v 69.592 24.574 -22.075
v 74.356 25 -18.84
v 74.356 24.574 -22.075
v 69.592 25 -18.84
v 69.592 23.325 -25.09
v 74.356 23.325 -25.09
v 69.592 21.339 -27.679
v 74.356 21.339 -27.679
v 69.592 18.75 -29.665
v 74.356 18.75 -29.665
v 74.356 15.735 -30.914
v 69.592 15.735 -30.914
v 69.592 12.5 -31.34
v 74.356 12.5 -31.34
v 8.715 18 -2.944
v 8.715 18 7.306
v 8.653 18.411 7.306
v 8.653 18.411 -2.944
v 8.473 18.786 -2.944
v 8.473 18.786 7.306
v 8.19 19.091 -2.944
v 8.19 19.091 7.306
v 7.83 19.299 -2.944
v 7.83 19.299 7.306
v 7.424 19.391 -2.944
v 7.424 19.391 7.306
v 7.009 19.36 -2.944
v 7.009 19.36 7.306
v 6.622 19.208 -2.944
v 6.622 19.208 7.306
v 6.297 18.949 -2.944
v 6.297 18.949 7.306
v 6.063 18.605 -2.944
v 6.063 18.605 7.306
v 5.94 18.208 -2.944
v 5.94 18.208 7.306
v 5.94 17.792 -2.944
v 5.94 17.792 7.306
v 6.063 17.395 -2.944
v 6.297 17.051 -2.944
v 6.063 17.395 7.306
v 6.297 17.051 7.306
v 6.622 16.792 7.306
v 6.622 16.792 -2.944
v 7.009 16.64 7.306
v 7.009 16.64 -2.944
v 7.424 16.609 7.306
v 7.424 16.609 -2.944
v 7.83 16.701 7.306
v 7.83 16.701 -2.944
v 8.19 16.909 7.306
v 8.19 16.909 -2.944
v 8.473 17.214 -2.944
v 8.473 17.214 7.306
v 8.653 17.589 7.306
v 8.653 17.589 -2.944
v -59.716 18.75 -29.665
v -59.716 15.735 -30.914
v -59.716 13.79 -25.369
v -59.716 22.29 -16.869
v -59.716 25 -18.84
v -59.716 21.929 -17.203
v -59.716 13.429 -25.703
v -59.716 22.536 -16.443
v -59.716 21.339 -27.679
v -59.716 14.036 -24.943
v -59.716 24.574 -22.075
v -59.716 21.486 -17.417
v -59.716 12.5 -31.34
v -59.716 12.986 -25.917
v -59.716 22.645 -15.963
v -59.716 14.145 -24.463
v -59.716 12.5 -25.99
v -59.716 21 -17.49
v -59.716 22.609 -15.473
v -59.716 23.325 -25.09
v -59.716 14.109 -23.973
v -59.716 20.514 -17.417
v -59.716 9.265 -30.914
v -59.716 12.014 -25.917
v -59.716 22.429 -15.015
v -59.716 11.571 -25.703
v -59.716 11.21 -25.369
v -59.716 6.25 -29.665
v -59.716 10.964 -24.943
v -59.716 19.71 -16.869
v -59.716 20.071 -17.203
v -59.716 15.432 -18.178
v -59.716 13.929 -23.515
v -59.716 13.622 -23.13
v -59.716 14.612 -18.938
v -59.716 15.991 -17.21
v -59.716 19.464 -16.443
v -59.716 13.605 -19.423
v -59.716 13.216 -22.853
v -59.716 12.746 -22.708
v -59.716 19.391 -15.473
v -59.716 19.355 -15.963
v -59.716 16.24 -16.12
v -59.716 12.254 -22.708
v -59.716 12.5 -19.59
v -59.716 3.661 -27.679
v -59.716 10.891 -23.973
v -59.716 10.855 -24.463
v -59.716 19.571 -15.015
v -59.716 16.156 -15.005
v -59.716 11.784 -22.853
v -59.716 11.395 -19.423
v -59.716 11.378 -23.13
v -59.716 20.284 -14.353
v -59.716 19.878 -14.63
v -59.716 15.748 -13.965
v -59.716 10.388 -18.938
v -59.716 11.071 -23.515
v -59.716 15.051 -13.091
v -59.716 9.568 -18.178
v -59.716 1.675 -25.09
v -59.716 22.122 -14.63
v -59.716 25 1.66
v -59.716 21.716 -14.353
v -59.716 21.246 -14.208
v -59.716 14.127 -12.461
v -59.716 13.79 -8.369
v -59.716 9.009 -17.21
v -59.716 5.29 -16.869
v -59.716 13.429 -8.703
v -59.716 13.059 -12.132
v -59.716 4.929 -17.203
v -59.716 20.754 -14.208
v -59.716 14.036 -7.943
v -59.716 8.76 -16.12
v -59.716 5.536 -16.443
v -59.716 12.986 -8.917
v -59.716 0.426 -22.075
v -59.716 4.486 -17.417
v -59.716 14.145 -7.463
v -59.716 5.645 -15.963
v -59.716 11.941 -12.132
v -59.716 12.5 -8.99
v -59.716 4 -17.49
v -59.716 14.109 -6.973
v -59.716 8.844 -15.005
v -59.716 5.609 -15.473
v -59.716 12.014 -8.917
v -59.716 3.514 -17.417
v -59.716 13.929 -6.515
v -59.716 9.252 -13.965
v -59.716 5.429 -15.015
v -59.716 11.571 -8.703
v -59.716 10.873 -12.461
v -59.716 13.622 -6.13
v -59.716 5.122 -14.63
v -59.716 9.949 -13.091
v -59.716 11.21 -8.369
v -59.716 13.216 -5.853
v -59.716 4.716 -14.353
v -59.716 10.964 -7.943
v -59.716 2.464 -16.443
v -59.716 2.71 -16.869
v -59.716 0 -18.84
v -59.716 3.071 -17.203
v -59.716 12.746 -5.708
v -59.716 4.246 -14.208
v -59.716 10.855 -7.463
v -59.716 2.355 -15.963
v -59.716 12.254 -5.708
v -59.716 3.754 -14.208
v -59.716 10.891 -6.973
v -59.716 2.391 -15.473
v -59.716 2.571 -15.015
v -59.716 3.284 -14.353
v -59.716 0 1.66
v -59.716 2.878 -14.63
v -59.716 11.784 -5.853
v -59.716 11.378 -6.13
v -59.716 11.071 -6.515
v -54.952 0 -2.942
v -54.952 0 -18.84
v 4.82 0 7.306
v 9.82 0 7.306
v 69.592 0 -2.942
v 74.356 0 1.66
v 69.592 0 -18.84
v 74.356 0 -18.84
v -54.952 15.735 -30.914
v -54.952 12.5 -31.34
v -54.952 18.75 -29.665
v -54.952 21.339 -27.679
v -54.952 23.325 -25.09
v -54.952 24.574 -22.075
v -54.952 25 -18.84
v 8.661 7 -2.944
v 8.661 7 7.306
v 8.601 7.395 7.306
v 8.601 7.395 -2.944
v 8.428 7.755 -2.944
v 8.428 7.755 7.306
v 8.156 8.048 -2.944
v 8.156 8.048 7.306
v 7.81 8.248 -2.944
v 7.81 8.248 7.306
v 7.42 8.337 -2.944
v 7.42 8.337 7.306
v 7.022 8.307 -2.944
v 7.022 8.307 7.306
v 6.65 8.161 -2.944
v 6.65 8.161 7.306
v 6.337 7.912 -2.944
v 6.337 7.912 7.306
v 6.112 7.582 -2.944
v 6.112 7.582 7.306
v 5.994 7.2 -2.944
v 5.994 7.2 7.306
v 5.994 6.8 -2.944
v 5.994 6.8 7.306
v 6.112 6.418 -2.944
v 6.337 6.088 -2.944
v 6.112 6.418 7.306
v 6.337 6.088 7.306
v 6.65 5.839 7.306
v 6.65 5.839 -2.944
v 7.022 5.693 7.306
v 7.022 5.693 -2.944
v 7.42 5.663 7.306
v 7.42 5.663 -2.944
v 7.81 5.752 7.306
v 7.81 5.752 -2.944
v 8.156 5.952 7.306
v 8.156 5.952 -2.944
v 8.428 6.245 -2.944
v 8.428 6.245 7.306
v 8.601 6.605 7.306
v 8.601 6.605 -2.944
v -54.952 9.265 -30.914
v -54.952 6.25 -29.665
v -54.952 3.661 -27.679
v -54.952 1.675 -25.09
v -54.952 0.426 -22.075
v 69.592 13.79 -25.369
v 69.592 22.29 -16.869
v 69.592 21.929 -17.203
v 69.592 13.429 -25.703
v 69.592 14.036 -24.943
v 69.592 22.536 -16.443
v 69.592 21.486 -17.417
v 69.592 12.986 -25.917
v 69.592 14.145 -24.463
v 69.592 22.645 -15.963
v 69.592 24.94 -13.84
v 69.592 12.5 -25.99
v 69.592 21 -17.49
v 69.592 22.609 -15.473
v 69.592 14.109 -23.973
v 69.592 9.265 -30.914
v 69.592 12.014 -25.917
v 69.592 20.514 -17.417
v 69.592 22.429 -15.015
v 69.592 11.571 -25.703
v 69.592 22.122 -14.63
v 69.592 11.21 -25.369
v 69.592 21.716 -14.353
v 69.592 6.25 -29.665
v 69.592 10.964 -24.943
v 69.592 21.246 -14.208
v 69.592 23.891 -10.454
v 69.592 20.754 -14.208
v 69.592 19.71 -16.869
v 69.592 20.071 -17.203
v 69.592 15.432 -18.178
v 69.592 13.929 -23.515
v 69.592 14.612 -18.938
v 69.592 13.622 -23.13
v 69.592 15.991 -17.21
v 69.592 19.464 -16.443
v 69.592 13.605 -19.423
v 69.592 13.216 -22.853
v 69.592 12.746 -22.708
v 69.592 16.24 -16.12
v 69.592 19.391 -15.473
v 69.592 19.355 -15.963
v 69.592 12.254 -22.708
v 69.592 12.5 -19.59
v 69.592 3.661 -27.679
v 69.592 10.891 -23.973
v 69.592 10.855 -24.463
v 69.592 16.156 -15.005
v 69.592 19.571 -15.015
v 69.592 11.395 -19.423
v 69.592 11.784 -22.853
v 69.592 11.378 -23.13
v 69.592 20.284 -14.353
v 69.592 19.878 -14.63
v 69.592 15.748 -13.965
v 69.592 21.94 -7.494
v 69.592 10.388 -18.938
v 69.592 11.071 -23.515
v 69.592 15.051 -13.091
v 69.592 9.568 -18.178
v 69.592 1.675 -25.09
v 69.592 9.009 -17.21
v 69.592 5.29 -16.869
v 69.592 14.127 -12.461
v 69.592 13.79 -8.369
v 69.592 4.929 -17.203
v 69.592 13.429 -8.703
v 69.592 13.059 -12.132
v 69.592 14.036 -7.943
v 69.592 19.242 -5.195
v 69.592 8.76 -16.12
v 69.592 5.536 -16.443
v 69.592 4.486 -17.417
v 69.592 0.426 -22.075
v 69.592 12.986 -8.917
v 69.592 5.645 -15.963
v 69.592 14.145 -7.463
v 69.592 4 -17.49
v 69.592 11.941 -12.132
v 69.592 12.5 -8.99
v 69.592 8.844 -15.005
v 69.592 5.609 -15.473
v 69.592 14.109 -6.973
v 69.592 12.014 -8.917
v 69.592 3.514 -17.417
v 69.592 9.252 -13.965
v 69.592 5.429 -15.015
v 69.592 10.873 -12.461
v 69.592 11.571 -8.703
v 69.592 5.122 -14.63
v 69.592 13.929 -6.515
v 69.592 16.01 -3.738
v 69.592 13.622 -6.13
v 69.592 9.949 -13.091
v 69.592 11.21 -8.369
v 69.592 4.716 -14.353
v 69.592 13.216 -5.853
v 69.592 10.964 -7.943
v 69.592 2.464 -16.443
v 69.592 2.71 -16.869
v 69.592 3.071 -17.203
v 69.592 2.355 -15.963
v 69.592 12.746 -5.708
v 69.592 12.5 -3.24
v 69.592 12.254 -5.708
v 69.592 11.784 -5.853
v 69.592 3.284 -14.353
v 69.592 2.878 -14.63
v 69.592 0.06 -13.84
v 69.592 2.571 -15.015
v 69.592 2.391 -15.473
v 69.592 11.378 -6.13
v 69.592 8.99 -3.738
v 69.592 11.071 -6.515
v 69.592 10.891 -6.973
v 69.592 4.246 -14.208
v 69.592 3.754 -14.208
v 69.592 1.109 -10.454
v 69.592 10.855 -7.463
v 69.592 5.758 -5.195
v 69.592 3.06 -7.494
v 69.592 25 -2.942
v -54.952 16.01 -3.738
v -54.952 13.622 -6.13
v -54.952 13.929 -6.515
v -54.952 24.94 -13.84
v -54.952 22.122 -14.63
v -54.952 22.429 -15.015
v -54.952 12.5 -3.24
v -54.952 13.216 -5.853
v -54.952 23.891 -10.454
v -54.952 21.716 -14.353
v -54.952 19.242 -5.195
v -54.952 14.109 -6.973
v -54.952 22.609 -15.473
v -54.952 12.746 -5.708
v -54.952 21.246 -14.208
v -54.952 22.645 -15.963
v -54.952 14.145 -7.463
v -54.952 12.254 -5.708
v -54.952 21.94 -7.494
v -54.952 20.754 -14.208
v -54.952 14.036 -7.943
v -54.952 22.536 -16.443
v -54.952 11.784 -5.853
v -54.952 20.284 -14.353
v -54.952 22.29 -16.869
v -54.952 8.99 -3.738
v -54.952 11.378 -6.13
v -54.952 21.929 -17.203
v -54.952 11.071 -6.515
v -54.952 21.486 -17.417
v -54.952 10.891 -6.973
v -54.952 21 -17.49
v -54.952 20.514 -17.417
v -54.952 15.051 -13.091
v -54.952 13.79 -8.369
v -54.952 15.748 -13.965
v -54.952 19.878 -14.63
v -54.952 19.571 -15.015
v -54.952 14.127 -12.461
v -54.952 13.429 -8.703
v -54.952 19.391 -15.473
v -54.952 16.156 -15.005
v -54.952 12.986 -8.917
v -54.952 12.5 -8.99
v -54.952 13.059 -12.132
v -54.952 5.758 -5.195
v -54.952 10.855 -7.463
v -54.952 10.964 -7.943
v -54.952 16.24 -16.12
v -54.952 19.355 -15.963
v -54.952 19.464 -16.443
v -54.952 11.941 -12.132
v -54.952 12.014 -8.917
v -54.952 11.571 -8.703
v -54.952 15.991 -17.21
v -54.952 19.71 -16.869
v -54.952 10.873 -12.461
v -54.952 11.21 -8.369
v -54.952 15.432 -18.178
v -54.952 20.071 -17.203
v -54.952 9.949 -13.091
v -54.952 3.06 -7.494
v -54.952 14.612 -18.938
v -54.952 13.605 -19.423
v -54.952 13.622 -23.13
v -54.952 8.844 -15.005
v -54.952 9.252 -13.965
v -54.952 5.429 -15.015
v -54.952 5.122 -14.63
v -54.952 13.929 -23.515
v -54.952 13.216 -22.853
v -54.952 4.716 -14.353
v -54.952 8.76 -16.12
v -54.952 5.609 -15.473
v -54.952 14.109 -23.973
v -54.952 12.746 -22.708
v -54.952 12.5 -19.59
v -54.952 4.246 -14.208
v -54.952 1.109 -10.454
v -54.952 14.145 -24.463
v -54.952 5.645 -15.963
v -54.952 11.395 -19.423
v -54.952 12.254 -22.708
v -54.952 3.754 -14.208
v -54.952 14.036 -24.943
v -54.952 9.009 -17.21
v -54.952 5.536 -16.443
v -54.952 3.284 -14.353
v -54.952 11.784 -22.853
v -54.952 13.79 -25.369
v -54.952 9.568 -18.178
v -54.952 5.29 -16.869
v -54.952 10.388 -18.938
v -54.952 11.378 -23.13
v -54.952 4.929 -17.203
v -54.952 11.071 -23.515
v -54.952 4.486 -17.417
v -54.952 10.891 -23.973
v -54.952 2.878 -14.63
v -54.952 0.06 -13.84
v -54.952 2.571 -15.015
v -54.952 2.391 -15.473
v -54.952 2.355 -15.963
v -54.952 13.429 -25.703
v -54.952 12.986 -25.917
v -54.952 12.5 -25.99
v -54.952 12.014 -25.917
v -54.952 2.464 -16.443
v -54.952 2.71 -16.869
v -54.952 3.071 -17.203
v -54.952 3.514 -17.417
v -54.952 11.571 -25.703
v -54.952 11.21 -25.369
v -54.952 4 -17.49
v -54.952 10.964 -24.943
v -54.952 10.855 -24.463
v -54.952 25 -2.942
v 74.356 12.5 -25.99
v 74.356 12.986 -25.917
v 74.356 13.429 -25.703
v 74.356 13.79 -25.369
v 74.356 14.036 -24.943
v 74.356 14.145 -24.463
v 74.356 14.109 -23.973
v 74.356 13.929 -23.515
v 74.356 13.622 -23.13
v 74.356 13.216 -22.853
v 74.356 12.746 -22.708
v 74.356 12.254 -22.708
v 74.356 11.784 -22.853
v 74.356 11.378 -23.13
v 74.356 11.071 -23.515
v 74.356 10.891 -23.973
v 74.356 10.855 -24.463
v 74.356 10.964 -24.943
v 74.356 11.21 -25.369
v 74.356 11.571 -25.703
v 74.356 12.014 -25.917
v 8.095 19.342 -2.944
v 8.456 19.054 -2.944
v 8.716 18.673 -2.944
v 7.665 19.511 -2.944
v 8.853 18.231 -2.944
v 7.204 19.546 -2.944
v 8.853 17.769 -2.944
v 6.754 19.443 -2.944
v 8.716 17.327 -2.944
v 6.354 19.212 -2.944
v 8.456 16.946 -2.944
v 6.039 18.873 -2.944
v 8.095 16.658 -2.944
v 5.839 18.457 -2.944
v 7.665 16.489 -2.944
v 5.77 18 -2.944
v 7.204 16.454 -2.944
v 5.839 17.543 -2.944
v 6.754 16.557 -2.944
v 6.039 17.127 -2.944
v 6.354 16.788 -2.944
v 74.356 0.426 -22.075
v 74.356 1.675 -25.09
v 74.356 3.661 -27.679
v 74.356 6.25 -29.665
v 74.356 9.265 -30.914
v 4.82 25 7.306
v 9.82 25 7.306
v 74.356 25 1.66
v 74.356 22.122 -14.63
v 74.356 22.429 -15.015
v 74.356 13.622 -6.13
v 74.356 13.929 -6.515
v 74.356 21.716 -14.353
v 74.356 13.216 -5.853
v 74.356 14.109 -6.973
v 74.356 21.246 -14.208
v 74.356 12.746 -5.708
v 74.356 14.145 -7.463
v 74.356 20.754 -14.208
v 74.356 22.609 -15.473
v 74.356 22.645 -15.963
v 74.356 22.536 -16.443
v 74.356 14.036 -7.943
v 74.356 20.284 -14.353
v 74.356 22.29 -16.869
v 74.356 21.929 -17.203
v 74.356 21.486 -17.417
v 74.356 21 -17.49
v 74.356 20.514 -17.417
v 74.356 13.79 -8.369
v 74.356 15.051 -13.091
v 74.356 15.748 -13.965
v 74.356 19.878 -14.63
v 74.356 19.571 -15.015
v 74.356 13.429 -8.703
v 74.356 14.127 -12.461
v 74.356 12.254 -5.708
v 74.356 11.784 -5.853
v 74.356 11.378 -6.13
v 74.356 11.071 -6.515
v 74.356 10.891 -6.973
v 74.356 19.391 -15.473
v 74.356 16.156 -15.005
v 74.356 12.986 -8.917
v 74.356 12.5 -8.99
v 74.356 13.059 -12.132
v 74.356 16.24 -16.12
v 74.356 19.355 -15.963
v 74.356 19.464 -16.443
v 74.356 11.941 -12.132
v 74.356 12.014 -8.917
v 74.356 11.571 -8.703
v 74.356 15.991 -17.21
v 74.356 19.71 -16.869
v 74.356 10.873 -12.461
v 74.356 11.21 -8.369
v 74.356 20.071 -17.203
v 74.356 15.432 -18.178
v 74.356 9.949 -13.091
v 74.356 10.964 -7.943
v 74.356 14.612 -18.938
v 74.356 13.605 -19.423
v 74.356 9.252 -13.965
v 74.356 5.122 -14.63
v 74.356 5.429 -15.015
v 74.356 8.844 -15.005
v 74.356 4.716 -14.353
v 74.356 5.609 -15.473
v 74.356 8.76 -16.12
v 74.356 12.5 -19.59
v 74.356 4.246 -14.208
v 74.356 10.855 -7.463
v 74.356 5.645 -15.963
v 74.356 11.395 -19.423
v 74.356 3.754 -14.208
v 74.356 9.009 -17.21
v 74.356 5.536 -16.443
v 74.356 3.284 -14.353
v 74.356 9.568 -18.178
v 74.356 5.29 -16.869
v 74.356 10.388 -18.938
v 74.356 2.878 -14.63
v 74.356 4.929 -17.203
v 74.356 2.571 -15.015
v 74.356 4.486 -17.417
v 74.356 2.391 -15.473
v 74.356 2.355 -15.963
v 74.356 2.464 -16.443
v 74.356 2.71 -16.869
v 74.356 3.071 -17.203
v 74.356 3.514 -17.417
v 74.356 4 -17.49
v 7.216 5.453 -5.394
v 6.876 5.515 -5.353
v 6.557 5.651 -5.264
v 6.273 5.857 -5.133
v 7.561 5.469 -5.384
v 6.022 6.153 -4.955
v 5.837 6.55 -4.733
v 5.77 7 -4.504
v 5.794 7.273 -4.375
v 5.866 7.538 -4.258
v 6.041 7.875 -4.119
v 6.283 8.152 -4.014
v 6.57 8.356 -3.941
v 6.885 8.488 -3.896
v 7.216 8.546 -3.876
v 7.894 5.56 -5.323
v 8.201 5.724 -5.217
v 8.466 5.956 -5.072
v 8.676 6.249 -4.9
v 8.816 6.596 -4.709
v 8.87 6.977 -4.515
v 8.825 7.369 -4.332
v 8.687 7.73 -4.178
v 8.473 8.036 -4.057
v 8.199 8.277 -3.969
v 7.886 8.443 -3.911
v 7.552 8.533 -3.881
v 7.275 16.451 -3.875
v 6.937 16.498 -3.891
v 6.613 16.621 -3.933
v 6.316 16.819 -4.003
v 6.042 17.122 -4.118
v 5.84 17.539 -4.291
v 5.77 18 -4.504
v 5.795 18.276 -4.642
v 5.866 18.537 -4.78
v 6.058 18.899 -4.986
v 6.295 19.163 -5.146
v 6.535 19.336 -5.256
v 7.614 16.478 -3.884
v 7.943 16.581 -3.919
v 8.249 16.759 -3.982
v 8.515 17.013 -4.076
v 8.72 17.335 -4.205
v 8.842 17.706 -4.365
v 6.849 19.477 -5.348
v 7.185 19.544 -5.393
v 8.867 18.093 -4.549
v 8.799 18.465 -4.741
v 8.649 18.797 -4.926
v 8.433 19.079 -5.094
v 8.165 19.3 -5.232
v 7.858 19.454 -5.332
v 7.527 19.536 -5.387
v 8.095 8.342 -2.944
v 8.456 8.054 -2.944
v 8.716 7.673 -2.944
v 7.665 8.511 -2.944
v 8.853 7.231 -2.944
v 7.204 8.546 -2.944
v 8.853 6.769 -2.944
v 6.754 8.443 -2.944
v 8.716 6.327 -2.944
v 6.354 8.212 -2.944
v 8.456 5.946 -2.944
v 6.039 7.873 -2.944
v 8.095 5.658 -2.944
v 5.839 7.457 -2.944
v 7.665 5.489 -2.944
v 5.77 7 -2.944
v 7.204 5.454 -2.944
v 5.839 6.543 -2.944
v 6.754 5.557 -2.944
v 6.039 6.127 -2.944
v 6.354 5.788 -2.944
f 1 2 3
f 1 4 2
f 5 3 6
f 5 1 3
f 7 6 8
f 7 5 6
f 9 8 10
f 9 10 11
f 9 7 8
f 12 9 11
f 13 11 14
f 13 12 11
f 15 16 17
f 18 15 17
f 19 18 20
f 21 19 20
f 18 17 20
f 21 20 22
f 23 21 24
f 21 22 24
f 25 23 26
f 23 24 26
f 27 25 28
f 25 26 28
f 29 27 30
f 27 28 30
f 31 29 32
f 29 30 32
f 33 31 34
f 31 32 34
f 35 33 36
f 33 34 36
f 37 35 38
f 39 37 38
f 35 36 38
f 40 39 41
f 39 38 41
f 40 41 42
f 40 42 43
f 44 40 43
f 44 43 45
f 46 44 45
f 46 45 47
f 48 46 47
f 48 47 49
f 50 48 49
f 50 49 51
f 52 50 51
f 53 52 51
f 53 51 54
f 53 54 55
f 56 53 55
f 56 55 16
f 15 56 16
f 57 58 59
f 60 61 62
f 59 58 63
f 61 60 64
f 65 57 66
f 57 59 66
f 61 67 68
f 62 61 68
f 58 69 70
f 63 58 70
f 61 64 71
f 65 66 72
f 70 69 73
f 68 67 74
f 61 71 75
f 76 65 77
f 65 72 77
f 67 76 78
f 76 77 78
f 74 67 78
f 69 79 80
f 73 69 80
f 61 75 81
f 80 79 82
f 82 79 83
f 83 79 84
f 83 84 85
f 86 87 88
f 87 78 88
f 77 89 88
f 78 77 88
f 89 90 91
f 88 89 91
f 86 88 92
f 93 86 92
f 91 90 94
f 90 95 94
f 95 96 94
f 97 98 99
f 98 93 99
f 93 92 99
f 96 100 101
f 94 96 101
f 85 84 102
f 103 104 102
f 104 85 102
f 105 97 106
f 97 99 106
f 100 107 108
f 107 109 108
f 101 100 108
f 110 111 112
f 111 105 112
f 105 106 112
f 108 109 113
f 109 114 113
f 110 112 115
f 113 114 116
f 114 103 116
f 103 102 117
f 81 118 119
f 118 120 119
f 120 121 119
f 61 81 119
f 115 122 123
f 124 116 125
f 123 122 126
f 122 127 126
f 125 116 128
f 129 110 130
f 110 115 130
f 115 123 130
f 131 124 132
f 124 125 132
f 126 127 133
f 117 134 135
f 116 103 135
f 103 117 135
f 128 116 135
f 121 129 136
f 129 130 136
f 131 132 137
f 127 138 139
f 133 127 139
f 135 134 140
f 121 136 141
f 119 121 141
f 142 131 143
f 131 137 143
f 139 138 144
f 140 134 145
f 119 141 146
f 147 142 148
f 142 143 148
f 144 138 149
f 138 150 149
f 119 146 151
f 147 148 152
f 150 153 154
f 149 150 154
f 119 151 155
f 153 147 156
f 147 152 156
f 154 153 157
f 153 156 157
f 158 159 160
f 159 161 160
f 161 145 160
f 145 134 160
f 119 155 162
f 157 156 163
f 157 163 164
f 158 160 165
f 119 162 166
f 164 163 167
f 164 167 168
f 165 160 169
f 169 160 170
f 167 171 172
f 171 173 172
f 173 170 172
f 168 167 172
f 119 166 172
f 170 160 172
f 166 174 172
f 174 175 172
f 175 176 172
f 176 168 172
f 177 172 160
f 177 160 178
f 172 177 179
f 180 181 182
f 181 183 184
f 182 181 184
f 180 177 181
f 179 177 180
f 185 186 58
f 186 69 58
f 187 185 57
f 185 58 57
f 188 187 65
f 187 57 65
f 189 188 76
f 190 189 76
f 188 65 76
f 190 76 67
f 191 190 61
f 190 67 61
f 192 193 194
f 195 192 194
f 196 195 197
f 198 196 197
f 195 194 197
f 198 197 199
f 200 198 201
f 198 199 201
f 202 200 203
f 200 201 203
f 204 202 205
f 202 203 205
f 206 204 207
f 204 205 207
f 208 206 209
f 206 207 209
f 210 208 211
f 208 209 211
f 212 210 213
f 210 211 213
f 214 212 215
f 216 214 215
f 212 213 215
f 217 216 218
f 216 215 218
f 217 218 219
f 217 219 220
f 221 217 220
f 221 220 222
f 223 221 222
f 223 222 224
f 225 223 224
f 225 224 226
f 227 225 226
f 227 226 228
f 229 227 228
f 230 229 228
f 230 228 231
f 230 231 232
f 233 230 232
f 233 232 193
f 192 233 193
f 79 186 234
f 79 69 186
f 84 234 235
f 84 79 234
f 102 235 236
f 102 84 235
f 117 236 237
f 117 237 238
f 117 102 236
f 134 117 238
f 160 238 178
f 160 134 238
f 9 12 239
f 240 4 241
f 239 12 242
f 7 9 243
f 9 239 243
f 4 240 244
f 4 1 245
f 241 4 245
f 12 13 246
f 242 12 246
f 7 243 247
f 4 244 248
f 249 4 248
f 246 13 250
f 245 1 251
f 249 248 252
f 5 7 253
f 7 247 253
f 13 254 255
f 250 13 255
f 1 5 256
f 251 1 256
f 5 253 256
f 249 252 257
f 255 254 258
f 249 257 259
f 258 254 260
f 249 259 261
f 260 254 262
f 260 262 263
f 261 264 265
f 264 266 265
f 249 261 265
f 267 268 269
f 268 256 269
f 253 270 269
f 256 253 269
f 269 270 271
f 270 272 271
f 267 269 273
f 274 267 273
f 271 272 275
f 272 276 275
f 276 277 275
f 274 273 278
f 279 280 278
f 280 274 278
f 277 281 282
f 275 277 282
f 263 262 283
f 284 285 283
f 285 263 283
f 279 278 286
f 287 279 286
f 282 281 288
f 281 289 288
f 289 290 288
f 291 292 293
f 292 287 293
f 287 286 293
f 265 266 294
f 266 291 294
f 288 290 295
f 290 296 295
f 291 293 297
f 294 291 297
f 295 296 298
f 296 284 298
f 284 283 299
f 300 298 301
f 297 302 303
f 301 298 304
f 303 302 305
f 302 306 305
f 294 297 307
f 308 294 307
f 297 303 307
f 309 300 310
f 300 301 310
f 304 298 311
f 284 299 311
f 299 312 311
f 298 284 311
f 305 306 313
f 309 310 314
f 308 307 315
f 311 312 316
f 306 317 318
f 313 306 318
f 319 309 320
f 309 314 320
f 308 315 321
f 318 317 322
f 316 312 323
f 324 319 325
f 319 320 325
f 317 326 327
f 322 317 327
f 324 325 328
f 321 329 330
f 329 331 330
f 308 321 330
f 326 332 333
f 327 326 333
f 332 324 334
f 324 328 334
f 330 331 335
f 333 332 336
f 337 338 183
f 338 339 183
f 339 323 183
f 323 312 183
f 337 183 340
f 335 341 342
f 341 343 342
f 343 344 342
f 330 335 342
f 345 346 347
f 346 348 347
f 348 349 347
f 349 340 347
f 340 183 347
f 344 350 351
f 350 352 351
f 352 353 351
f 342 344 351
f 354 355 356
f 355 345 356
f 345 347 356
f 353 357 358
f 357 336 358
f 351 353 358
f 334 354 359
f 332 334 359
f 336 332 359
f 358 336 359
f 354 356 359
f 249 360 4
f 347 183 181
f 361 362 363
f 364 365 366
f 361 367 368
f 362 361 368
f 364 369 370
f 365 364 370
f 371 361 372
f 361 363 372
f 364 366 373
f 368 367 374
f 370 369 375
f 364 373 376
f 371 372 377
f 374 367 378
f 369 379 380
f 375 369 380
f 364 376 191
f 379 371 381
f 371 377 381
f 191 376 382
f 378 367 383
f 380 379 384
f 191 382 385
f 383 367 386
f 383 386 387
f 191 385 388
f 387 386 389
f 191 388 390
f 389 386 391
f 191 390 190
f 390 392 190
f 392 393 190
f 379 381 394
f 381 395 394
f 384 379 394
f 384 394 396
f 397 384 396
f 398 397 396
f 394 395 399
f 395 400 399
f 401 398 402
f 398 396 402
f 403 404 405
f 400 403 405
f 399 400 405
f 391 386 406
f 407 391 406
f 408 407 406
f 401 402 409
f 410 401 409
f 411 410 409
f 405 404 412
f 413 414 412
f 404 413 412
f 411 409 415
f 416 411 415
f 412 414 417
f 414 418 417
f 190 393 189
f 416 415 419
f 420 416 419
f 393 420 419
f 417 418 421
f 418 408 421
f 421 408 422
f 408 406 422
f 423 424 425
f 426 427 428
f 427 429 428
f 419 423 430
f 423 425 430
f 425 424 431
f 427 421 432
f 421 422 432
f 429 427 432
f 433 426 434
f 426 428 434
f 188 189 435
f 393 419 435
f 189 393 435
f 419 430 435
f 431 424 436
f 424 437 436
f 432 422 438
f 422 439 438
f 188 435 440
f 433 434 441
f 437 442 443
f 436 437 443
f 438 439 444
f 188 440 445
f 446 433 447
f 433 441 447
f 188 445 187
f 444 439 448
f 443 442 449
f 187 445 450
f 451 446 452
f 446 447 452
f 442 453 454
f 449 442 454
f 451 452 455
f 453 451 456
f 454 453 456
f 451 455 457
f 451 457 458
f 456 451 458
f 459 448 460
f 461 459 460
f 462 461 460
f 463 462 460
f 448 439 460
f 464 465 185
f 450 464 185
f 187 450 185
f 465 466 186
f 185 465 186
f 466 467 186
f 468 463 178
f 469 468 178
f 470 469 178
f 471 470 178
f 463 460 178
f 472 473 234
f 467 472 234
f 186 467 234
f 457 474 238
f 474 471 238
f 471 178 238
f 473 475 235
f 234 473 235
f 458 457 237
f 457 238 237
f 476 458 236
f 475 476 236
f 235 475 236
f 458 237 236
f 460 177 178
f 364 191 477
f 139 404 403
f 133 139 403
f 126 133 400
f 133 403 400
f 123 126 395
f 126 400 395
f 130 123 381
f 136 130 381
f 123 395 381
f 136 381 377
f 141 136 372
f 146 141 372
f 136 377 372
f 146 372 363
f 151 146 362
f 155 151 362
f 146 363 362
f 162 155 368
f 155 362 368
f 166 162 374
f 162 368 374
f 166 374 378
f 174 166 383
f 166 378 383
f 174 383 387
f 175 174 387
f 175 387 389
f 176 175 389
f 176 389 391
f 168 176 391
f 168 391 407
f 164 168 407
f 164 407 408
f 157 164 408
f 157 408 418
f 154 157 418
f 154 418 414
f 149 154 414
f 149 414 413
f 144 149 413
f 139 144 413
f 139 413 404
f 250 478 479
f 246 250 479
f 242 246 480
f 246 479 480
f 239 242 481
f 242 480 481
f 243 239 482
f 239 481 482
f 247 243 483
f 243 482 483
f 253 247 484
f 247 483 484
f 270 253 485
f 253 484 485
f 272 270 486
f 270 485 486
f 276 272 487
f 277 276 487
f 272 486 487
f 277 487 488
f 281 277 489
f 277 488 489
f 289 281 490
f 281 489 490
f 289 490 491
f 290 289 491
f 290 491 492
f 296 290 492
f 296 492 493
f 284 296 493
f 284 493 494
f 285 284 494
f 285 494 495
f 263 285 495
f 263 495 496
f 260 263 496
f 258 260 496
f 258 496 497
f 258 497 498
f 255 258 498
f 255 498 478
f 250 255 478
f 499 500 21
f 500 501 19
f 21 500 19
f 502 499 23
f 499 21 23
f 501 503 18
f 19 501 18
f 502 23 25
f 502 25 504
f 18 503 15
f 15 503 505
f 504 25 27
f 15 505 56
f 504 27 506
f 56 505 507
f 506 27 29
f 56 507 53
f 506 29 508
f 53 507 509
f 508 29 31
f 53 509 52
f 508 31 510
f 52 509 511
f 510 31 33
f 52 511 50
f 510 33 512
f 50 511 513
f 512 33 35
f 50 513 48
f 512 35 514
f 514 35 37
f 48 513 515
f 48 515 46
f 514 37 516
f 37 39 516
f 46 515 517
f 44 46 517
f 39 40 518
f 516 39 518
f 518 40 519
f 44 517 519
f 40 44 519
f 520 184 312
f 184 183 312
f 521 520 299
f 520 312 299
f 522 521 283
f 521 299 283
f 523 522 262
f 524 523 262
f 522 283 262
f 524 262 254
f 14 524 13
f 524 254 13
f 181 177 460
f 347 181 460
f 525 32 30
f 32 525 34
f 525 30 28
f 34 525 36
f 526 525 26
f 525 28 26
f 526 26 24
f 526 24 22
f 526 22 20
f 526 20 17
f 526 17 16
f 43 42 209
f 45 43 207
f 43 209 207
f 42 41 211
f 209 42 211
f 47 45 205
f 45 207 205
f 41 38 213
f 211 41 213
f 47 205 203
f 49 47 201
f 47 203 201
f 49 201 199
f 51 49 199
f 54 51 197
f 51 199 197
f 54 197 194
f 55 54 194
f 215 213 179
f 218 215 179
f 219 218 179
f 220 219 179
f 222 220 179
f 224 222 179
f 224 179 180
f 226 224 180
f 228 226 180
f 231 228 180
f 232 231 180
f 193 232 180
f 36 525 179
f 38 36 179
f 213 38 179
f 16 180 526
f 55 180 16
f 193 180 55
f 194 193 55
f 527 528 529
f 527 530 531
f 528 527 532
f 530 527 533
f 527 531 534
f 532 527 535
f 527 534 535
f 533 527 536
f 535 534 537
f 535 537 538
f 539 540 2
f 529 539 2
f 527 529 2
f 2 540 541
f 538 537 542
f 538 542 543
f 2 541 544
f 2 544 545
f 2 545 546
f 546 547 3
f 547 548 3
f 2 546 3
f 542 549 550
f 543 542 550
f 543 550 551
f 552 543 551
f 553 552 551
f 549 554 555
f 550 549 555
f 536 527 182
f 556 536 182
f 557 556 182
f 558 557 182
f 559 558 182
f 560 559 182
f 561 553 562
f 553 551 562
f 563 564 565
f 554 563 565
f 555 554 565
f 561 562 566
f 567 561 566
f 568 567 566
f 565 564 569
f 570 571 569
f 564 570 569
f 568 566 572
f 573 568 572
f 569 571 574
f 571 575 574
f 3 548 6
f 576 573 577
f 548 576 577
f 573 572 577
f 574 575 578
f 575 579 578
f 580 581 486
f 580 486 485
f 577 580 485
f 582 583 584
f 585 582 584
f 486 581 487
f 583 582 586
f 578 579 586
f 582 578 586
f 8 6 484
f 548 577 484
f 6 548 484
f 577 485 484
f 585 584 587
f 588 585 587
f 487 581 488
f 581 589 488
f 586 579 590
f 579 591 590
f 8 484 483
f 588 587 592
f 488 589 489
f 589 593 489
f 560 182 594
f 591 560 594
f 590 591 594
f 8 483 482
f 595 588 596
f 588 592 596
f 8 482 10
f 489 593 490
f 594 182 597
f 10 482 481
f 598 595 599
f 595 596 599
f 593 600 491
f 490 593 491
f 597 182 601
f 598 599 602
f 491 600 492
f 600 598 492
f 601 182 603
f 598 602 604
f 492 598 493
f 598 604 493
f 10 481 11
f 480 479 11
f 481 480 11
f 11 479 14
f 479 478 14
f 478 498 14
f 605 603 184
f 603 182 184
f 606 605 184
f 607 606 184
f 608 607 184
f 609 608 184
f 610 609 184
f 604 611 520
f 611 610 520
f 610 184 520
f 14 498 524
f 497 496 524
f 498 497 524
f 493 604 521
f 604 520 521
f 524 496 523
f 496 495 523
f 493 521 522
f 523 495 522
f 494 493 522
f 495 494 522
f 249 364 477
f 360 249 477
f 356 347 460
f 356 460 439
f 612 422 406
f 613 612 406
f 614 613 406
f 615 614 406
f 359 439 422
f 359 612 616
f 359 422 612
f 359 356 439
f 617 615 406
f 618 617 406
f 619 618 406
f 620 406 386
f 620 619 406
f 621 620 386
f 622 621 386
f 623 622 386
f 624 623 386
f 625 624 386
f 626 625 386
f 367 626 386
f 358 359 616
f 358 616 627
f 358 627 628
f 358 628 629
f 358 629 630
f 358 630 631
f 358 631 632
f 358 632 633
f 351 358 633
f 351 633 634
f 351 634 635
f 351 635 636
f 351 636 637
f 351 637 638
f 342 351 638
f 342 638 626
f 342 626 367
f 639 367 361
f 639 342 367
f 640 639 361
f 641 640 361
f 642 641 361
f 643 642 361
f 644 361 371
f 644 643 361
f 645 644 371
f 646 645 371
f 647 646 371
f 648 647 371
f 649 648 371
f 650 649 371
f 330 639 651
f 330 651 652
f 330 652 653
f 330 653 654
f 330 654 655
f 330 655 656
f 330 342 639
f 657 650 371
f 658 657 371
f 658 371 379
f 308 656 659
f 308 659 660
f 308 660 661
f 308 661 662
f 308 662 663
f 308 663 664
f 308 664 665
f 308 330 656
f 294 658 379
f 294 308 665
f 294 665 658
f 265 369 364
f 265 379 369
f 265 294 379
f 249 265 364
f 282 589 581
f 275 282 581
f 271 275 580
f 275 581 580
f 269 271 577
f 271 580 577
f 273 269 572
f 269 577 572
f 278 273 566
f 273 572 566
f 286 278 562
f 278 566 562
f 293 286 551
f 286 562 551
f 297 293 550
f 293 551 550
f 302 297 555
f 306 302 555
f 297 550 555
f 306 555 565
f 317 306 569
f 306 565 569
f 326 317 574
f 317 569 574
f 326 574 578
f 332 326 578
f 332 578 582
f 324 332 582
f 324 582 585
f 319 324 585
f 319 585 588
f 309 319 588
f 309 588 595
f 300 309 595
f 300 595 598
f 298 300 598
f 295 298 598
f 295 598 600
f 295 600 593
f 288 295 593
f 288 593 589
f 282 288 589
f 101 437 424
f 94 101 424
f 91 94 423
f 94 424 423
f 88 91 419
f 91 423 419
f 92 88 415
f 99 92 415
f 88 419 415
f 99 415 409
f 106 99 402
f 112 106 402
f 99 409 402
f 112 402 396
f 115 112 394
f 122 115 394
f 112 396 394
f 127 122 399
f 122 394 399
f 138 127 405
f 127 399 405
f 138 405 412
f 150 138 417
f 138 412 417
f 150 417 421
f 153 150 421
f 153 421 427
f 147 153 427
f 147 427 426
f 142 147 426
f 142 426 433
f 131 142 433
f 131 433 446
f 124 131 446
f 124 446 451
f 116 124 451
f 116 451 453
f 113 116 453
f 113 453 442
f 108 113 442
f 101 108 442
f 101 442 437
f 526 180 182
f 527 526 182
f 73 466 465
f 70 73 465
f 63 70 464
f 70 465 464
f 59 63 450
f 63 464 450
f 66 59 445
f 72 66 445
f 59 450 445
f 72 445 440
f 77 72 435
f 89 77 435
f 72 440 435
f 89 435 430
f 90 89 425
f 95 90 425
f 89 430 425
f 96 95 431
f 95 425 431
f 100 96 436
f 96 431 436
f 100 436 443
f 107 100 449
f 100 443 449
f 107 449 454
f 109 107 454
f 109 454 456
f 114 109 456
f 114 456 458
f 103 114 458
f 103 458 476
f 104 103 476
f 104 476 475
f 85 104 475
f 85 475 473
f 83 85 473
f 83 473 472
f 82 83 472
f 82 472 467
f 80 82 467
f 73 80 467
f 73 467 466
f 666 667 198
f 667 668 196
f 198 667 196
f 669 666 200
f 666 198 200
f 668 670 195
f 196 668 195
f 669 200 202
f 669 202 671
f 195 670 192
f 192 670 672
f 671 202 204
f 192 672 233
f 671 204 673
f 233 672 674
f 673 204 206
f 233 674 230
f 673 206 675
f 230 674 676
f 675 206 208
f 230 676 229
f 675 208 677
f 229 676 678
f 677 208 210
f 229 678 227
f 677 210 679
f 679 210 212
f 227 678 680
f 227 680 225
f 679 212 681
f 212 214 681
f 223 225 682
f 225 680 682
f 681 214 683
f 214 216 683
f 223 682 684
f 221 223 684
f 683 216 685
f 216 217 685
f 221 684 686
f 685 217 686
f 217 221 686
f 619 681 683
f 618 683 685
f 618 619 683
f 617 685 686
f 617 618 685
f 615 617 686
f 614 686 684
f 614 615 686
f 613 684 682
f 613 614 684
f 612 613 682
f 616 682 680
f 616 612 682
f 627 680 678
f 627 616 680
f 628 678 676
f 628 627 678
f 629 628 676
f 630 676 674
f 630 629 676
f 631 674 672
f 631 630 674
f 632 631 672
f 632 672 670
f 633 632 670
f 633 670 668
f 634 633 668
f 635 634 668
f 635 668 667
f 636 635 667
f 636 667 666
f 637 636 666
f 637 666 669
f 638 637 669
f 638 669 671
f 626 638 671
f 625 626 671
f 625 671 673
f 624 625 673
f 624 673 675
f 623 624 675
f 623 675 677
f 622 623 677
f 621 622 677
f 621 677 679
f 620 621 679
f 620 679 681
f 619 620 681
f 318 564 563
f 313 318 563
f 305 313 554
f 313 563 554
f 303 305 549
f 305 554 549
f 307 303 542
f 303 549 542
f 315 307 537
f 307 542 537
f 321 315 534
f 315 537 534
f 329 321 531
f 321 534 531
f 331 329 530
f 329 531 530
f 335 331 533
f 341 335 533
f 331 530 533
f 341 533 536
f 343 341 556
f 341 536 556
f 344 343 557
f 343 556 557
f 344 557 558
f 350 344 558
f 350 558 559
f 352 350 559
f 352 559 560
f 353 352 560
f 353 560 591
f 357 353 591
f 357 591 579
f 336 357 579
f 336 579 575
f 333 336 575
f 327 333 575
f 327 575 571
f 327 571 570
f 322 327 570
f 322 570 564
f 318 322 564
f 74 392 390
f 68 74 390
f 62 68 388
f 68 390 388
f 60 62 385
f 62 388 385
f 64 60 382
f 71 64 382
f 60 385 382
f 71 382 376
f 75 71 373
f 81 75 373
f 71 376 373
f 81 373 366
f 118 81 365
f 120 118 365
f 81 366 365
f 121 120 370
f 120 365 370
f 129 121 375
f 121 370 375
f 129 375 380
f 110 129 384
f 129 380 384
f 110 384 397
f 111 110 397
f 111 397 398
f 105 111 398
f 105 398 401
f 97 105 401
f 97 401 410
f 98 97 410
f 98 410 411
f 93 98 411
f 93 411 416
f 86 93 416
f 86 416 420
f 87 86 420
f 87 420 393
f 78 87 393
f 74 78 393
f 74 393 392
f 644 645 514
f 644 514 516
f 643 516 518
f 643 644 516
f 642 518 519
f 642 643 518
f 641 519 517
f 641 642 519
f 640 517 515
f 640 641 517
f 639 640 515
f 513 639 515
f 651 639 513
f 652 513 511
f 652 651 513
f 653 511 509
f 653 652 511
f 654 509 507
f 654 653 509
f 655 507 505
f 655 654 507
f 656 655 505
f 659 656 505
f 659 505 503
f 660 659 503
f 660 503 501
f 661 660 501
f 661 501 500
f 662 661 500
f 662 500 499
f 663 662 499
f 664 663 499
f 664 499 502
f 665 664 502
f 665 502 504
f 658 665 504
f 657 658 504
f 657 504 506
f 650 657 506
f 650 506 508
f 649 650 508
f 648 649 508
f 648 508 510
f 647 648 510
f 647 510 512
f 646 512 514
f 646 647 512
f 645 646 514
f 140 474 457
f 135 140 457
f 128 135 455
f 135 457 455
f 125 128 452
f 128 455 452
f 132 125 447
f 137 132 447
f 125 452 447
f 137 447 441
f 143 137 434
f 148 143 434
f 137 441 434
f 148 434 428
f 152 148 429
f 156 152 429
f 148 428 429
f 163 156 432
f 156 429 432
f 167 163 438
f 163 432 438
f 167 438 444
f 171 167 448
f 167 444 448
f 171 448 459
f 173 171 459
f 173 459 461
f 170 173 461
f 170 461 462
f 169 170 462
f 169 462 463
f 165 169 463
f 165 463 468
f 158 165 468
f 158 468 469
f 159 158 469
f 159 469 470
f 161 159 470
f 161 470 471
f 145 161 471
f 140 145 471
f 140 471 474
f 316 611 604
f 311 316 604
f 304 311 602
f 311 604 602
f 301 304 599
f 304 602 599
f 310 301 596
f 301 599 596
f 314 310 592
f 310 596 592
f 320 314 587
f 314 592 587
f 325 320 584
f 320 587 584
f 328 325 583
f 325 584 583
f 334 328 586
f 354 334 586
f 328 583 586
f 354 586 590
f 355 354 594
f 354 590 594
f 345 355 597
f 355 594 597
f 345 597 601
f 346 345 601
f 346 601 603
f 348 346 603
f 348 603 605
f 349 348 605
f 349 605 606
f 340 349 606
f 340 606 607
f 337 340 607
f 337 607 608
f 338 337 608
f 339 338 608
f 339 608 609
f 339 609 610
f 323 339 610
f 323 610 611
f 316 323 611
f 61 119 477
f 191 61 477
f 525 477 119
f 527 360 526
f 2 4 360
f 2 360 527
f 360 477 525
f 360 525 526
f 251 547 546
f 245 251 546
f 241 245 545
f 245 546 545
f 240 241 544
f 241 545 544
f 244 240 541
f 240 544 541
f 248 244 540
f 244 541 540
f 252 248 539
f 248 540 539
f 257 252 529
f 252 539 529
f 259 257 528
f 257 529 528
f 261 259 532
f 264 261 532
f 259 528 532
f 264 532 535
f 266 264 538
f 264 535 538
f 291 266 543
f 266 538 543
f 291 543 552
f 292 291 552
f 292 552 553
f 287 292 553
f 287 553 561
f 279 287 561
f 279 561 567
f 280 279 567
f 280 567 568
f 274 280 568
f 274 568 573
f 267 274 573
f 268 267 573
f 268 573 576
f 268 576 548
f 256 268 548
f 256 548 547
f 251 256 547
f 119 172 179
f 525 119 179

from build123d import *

# Parameters (mm, degrees)
RESSALTO_EXTRUS_O1_DEPTH = 25
ESBO_O2_R                = 3.75
ESBO_O2_R_2              = 1.65
CORTE_EXTRUS_O1_DEPTH    = 140.936789771
FILETE1_R                = 12.5
RESSALTO_EXTRUS_O2_REACH = 137.379
RESSALTO_EXTRUS_O3_DEPTH = 25
ESBO_O3_R                = 1.340765279
ESBO_O3_R_2              = 1.395401155
CORTE_EXTRUS_O4_DEPTH    = 25
ESBO_O10_R               = 1.55
CORTE_EXTRUS_O5_DEPTH    = 3


with BuildPart() as part:
    # Esboço1 → Ressalto-extrusão1 (new body)
    with BuildSketch(Plane(origin=(0, 0, 0), x_dir=(1, 0, 0), z_dir=(0, 1, 0))):
        Polygon((-59.715709909, 31.339816021), (-59.715709909, -1.660183979), (4.819954225, -7.306322984), (9.819954225, -7.306322984), (74.355618358, -1.660183979), (74.355618358, 31.339816021), (69.59163611, 31.339816021), (69.59163611, 2.942120769), (9.819954225, -2.287223796), (4.819954225, -2.287223796), (-54.951727661, 2.942120769), (-54.951727661, 31.339816021), align=None)
    extrude(amount=RESSALTO_EXTRUS_O1_DEPTH)

    # Esboço2 → Corte-extrusão1 (cut, through all)
    with BuildSketch(Plane(origin=(74.355618358, 0, 0), x_dir=(0, 0, -1), z_dir=(1, 0, 0))):
        with Locations((15.839816021, 12.5)):
            Circle(ESBO_O2_R)
        with Locations((24.339816021, 12.5)):
            Circle(ESBO_O2_R_2)
        with Locations((15.839816021, 4)):
            Circle(ESBO_O2_R_2)
        with Locations((15.839816021, 21)):
            Circle(ESBO_O2_R_2)
        with Locations((7.339816021, 12.5)):
            Circle(ESBO_O2_R_2)
    extrude(amount=-CORTE_EXTRUS_O1_DEPTH, mode=Mode.SUBTRACT)

    # Filete1
    filete1_edges = [part.edges().sort_by_distance(p)[0] for p in [
        (-57.333718785, 25, -31.339816021),
        (-57.333718785, 0, -31.339816021),
        (71.973627234, 25, -31.339816021),
        (71.973627234, 0, -31.339816021),
    ]]
    fillet(filete1_edges, radius=FILETE1_R - 0.0001)  # a hair under: the kernel refuses the full size

    # Ressalto-extrusão2: up to this face of the body (flat: up to its plane)
    ressalto_extrus_o2_end = Plane(part.part.faces().sort_by_distance((-54.951727661, 0.378342318, -10.891018395))[0])
    # Esboço6 → Ressalto-extrusão2 (add, up to the picked face)
    with BuildSketch(Plane.ZY.offset(-69.59163611), mode=Mode.PRIVATE) as ressalto_extrus_o2_sk1:
        with BuildLine():
            ThreePointArc((-13.839816021, 0.059742768), (-3.239816021, 12.5), (-13.839816021, 24.940257232))
            Line((-13.839816021, 24.940257232), (-2.942120769, 25))
            Line((-2.942120769, 25), (-2.942120769, 0))
            Line((-2.942120769, 0), (-13.839816021, 0.059742768))
        make_face()
    ressalto_extrus_o2_tool1 = split(extrude(ressalto_extrus_o2_sk1.sketch, amount=RESSALTO_EXTRUS_O2_REACH, mode=Mode.PRIVATE), bisect_by=ressalto_extrus_o2_end, keep=Keep.BOTH, mode=Mode.PRIVATE)
    add(ressalto_extrus_o2_tool1.solids().sort_by(Axis((69.591636, 24.697413, -8.389473), (-1, 0, 0)))[0])

    # Esboço8 → Ressalto-extrusão3 (add)
    with BuildSketch(Plane(origin=(0, 0, 0), x_dir=(-1, 0, 0), z_dir=(0, -1, 0))):
        Polygon((54.951727661, 2.942120769), (-4.819954225, -2.287223796), (-9.819954225, -2.287223796), (-69.59163611, 2.942120769), align=None)
    extrude(amount=-RESSALTO_EXTRUS_O3_DEPTH)

    # Esboço3 → Corte-extrusão4 (cut)
    with BuildSketch(Plane.XY.offset(7.306322984)):
        with Locations((7.319954225, 7)):
            Circle(ESBO_O3_R)
        with Locations((7.319954225, 18)):
            Circle(ESBO_O3_R_2)
    extrude(amount=-CORTE_EXTRUS_O4_DEPTH, mode=Mode.SUBTRACT)

    # Esboço10 → Corte-extrusão5 (cut)
    with BuildSketch(Plane.XY.offset(-5.943677016)):
        with Locations(Location((7.319954225, 7, 0), (0, 0, 180))):
            Circle(ESBO_O10_R)
        with Locations(Location((7.319954225, 18, 0), (0, 0, 180))):
            Circle(ESBO_O10_R)
    extrude(amount=CORTE_EXTRUS_O5_DEPTH, mode=Mode.SUBTRACT)


solid = part.part
